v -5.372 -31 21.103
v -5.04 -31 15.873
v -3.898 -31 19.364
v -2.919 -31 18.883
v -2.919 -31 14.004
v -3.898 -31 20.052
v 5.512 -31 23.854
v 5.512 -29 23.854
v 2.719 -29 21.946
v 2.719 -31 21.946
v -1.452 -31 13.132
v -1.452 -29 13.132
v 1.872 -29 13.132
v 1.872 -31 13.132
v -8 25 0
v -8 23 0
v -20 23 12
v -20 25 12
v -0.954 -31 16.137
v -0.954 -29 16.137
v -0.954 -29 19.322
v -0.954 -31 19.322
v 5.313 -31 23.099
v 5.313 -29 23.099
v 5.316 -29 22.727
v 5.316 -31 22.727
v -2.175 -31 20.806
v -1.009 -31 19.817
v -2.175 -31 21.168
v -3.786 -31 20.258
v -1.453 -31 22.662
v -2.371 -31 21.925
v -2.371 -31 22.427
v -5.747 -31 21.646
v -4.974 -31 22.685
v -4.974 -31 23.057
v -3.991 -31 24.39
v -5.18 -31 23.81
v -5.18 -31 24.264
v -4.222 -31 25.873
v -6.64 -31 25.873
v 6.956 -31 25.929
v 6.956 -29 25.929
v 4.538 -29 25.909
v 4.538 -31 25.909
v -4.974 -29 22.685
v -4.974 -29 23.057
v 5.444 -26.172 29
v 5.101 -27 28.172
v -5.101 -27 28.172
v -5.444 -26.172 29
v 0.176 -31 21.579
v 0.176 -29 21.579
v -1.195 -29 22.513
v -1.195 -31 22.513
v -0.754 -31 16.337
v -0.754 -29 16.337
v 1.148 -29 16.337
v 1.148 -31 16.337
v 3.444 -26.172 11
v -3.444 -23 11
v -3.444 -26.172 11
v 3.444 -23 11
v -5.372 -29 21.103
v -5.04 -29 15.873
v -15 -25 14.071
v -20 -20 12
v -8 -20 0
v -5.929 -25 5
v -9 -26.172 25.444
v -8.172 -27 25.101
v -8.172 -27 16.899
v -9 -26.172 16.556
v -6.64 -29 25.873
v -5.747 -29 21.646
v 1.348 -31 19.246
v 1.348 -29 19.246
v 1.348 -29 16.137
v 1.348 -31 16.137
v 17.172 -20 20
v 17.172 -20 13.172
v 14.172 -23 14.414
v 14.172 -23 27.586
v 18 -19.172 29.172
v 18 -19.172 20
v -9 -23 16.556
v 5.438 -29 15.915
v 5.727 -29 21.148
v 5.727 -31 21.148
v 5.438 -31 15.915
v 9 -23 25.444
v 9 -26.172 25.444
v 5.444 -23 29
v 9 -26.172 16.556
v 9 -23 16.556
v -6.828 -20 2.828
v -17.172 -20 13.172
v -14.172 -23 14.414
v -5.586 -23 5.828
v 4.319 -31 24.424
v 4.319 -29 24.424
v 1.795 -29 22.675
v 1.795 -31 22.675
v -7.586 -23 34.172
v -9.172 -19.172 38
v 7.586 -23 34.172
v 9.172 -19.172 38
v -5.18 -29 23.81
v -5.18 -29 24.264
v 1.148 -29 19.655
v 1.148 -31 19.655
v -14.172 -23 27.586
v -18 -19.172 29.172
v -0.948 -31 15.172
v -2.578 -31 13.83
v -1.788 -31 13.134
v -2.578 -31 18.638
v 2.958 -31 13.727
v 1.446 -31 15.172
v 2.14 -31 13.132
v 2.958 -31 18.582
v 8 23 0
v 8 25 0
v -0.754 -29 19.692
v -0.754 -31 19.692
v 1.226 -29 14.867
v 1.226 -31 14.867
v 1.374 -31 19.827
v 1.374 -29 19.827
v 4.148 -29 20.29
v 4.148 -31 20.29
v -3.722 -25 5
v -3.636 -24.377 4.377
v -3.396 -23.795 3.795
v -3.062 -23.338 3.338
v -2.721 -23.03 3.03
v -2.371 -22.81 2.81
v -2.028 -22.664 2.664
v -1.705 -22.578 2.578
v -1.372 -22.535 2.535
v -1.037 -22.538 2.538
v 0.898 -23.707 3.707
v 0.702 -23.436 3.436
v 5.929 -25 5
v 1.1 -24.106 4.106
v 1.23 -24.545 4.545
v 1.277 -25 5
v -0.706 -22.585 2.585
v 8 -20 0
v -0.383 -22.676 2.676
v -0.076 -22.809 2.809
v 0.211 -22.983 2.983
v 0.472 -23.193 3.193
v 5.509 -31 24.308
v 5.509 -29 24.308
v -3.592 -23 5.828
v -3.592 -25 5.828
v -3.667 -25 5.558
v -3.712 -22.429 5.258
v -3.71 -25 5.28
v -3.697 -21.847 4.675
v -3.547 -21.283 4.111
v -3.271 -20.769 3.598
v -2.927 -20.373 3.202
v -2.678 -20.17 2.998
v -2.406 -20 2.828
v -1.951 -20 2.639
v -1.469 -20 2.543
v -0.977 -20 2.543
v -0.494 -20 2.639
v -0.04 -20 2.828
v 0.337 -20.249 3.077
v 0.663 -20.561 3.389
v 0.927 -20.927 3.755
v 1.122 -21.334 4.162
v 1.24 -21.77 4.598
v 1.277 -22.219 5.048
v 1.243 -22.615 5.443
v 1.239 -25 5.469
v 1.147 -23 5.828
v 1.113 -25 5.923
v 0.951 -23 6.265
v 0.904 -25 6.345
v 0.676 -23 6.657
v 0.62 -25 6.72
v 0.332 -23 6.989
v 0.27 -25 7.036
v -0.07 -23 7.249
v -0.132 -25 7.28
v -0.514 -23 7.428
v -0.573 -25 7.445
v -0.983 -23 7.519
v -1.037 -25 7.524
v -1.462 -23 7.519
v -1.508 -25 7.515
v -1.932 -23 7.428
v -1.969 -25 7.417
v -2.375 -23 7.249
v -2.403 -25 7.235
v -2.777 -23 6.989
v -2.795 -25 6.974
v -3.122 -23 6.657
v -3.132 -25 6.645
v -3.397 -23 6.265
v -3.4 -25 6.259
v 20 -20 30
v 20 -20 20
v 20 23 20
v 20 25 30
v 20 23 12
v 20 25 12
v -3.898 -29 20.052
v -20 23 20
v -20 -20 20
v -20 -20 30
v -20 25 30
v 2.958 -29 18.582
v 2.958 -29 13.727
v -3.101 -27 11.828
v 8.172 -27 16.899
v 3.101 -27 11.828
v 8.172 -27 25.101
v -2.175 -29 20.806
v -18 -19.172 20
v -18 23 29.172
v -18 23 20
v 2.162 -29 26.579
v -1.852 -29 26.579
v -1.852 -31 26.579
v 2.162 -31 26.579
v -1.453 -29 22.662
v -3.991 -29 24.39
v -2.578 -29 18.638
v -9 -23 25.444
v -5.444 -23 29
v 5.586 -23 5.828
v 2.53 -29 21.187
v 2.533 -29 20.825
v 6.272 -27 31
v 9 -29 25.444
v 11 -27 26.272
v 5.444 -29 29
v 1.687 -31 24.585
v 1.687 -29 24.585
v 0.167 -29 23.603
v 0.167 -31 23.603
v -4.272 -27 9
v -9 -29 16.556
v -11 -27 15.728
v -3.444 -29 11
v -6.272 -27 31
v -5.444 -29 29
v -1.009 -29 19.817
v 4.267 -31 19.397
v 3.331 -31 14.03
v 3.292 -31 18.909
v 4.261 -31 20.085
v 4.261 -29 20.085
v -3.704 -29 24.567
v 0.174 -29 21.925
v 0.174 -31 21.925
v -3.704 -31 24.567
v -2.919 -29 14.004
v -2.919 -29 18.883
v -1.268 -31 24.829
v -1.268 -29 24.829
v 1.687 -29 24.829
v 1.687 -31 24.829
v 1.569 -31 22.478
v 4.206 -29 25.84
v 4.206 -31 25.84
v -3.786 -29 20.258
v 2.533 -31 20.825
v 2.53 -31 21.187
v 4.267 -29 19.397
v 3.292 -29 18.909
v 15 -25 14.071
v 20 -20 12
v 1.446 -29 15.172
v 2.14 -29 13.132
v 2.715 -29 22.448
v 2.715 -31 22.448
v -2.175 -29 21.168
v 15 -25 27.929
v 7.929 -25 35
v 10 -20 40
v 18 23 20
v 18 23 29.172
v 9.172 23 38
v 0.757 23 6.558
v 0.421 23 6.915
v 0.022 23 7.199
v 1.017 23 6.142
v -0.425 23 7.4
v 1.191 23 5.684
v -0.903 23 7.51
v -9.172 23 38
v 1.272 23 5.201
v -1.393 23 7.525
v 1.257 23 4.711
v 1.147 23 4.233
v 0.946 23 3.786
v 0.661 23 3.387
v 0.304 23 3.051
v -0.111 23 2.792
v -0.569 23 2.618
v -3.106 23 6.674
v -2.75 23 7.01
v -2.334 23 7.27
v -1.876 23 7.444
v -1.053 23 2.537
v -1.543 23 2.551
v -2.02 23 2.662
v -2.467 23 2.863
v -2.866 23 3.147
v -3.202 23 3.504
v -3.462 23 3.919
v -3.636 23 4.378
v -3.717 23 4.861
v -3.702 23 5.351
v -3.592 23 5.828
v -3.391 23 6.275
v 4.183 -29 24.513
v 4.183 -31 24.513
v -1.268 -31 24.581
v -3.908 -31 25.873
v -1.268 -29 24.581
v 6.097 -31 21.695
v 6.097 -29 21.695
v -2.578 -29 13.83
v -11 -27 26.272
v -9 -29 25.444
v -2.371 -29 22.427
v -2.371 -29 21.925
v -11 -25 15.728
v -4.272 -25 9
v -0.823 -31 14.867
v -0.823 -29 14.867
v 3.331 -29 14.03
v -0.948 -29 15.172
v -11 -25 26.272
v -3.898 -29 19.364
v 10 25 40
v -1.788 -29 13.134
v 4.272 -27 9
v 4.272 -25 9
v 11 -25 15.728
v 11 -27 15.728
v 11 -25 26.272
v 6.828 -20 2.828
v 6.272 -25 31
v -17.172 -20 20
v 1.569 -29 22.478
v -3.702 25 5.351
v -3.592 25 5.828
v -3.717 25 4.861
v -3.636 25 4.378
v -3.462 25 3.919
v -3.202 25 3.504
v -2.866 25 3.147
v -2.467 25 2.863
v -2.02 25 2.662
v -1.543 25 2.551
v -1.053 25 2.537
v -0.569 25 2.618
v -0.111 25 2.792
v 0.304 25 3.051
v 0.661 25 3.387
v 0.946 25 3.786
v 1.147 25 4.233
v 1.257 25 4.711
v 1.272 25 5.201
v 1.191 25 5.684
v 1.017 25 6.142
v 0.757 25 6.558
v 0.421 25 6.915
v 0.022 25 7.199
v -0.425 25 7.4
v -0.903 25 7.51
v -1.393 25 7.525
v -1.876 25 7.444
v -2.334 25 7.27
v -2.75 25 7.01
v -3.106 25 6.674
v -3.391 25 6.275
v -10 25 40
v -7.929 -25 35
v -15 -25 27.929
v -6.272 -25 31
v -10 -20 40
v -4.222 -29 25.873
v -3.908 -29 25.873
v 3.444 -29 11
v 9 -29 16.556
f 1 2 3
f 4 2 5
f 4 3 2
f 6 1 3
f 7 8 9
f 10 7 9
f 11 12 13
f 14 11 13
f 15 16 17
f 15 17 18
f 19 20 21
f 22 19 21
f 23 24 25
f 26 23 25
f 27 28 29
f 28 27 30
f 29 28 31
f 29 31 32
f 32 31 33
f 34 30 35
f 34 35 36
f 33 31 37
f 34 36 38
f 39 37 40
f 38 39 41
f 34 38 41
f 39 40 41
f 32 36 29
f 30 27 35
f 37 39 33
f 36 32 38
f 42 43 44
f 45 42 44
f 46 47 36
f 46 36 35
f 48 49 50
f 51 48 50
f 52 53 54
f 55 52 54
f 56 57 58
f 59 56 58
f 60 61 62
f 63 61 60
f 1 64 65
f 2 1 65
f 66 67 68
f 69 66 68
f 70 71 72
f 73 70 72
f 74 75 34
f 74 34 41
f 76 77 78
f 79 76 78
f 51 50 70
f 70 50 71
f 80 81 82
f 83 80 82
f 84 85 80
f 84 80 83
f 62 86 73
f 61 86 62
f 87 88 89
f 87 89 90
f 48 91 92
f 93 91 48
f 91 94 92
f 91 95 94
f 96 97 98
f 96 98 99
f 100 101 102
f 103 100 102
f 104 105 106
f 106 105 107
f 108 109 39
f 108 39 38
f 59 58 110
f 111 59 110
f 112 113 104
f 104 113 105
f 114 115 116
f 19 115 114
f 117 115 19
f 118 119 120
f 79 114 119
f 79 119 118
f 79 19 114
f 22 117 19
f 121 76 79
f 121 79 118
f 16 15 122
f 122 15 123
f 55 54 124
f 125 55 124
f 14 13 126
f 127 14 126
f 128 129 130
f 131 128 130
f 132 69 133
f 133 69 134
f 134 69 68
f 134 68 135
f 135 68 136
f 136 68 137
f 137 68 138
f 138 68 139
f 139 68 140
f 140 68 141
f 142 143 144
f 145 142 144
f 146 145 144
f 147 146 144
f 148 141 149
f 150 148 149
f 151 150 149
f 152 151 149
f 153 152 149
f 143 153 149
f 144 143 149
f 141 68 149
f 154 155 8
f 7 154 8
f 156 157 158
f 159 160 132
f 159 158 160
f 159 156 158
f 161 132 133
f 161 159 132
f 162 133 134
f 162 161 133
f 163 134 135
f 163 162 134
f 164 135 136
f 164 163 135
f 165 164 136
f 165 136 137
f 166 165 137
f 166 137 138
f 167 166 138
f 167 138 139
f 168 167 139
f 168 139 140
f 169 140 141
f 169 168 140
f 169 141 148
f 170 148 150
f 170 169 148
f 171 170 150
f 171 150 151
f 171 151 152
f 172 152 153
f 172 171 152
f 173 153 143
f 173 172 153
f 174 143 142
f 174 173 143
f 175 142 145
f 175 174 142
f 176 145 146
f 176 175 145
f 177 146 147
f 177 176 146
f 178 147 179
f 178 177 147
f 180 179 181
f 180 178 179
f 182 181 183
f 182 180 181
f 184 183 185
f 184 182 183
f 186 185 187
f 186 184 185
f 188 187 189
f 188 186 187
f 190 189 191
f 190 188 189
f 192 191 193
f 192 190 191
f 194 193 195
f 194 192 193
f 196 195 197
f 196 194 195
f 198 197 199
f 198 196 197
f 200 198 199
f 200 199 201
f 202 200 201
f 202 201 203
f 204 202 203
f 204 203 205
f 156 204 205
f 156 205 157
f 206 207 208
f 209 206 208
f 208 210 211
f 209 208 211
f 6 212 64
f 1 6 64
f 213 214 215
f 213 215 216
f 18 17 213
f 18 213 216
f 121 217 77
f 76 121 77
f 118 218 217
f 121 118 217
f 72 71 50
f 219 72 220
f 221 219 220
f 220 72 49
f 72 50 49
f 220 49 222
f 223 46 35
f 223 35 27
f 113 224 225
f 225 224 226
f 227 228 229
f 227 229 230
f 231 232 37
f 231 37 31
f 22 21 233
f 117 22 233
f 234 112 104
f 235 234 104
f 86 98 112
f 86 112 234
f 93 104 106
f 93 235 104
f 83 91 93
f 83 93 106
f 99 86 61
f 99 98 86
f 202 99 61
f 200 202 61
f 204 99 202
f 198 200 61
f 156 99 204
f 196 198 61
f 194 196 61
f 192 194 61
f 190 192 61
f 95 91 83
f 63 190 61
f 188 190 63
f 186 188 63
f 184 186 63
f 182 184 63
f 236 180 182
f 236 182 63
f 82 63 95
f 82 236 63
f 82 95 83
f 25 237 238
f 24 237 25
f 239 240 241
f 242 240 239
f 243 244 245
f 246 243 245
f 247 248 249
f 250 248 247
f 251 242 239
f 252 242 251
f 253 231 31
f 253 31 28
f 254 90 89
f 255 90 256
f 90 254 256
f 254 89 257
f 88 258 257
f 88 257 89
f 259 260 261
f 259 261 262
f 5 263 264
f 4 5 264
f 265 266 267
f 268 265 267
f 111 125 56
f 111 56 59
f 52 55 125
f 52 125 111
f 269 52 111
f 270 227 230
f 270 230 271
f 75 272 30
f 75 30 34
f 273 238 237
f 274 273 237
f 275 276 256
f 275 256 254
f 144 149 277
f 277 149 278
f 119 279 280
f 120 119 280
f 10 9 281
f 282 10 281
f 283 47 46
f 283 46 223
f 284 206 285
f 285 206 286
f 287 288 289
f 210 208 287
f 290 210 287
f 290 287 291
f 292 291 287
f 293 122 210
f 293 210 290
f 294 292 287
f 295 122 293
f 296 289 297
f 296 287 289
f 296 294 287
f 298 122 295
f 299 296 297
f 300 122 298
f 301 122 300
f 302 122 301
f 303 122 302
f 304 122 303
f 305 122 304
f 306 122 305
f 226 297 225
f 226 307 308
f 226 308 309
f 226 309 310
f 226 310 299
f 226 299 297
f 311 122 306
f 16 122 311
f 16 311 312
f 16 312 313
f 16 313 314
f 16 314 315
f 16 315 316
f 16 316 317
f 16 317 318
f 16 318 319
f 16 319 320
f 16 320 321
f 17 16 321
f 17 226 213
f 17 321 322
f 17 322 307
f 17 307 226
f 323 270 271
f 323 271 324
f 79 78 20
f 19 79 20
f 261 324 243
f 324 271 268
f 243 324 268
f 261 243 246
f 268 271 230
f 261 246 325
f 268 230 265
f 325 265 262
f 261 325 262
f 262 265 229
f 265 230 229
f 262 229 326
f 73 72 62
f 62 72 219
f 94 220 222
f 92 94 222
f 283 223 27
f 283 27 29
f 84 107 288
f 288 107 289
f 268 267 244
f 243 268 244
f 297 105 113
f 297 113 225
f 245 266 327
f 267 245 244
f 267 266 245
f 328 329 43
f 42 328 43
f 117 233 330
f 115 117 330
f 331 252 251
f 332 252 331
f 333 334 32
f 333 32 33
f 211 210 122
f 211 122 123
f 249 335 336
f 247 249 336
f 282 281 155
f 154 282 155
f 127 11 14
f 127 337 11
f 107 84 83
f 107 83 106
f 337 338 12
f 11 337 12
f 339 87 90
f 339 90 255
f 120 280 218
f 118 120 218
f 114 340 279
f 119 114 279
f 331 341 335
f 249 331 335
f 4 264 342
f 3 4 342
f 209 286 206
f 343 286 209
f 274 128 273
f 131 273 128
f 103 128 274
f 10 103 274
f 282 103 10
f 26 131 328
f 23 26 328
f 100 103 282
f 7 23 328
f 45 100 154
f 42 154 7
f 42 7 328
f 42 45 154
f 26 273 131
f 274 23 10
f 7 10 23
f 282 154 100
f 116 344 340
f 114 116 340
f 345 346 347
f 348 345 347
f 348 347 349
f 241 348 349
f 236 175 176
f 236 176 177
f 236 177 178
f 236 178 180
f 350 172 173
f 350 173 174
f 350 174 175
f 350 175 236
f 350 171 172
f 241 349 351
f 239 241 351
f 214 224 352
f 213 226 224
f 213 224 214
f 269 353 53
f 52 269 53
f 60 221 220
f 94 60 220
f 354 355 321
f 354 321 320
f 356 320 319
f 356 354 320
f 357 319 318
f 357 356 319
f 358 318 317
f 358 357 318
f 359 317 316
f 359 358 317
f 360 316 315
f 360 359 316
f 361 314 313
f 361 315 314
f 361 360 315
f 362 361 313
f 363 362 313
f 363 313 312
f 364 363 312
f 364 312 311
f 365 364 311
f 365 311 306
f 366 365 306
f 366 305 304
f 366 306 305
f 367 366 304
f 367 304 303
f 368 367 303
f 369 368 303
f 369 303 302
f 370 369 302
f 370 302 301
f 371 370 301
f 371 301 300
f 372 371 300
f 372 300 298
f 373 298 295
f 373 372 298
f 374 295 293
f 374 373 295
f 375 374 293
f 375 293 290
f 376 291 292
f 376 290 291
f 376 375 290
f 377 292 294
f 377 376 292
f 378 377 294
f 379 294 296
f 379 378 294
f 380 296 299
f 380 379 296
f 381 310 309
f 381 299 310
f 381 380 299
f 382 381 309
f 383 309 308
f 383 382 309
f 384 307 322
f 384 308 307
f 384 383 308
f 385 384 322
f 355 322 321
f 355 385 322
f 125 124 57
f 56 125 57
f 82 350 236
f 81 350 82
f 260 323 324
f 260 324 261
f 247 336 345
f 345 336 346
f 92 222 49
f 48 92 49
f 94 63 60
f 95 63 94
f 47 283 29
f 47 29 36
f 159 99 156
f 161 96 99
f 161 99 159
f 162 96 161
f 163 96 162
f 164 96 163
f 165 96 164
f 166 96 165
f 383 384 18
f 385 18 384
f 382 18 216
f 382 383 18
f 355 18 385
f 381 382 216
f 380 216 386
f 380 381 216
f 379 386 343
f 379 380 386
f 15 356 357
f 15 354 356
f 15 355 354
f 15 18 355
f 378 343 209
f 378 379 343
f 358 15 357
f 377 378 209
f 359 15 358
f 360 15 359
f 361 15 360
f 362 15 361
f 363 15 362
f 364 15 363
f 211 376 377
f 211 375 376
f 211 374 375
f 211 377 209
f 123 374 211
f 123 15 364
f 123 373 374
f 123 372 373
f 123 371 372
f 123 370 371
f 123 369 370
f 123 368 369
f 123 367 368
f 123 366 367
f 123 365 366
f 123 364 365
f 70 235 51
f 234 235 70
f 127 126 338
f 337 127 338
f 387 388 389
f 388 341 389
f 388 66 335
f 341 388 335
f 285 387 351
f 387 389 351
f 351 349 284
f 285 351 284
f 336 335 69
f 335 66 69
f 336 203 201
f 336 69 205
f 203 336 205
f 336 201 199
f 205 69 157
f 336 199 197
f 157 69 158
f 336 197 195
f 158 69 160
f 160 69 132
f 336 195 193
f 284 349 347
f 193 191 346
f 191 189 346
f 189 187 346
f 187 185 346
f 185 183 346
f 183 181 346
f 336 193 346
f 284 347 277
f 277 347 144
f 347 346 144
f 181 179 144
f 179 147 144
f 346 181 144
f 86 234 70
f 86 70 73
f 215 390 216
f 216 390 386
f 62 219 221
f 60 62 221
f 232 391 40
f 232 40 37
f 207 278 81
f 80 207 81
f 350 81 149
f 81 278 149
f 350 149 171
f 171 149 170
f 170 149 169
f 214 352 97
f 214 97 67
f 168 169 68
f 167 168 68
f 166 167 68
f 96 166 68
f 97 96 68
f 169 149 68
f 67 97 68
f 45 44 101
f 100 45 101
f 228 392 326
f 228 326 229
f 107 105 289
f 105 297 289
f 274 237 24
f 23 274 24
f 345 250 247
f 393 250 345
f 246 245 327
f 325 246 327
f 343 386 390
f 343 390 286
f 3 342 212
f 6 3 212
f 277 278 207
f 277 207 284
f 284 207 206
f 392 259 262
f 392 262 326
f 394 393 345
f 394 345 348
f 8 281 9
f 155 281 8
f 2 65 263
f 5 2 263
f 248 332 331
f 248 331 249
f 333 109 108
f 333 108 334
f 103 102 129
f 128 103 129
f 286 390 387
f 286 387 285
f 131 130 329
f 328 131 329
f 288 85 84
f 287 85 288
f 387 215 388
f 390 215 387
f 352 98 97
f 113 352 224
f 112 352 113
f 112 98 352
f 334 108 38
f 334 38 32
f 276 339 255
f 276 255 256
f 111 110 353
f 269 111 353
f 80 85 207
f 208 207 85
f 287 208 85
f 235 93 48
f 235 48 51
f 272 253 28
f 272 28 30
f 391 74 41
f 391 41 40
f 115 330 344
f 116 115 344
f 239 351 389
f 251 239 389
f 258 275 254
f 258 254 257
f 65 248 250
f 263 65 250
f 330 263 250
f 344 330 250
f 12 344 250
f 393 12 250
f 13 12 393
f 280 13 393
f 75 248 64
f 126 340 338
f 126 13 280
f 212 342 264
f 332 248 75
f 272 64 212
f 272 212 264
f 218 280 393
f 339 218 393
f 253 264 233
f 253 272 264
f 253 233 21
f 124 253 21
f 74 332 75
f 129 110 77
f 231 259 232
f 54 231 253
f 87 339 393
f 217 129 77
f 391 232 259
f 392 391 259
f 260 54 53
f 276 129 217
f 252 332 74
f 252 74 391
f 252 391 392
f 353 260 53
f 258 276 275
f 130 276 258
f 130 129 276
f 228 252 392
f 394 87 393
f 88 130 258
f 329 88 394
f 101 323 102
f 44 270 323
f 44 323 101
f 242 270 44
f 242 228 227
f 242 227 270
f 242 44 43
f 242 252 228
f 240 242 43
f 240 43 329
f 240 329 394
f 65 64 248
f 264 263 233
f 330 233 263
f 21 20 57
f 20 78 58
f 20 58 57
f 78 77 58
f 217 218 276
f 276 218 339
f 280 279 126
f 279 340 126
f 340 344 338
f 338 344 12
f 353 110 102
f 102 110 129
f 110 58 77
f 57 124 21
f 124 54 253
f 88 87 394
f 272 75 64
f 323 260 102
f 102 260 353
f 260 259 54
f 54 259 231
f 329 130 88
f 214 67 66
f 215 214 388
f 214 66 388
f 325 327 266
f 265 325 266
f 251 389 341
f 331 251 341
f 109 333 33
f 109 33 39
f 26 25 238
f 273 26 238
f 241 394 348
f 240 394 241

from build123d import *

# Parameters (mm, degrees)
SKETCH1_W               = 40
SKETCH1_H               = 50
BOSS_EXTRUDE1_DEPTH     = 40
CHAMFER1_SIZE           = 10
CHAMFER2_SIZE           = 12
CHAMFER4_SIZE           = 5
BOSS_EXTRUDE2_DEPTH     = 4
CHAMFER5_SIZE           = 2
SHELL1_T                = -2
SKETCH3_W               = 45
SKETCH3_H               = 43
CUT_EXTRUDE1_DEPTH      = 20
CUT_EXTRUDE2_DEPTH      = 69.585712798
CUT_EXTRUDE2_DEPTH_BACK = 10
SKETCH4_R               = 2.5
BOSS_EXTRUDE3_DEPTH     = 2


with BuildPart() as part:
    # Sketch1 → Boss-Extrude1 (new body)
    with BuildSketch(Plane.XY):
        Rectangle(SKETCH1_W, SKETCH1_H)
    extrude(amount=BOSS_EXTRUDE1_DEPTH)

    # Chamfer1
    chamfer1_edges = [part.edges().sort_by_distance(p)[0] for p in [
        (-20, 0, 40),
        (20, 0, 40),
    ]]
    chamfer(chamfer1_edges, length=CHAMFER1_SIZE)

    # Chamfer2
    chamfer2_edges = [part.edges().sort_by_distance(p)[0] for p in [
        (-20, 0, 0),
        (20, 0, 0),
    ]]
    chamfer(chamfer2_edges, length=CHAMFER2_SIZE)

    # Chamfer4
    chamfer4_edges = [part.edges().sort_by_distance(p)[0] for p in [
        (0, -25, 40),
        (20, -25, 21),
        (-20, -25, 21),
        (15, -25, 35),
        (-15, -25, 35),
        (0, -25, 0),
        (14, -25, 6),
        (-14, -25, 6),
    ]]
    chamfer(chamfer4_edges, length=CHAMFER4_SIZE)

    # Sketch2 → Boss-Extrude2 (add)
    with BuildSketch(Plane.XZ.offset(25)):
        Polygon((6.272077939, 31), (-6.272077939, 31), (-11, 26.272077939), (-11, 15.727922061), (-4.272077939, 9), (4.272077939, 9), (11, 15.727922061), (11, 26.272077939), align=None)
    extrude(amount=BOSS_EXTRUDE2_DEPTH)

    # Chamfer5
    chamfer5_edges = [part.edges().sort_by_distance(p)[0] for p in [
        (8.636038969, -29, 28.636038969),
        (0, -29, 31),
        (-8.636038969, -29, 28.636038969),
        (-11, -29, 21),
        (-7.636038969, -29, 12.363961031),
        (0, -29, 9),
        (7.636038969, -29, 12.363961031),
        (11, -29, 21),
    ]]
    chamfer(chamfer5_edges, length=CHAMFER5_SIZE)

    # Shell1
    shell1_openings = [part.faces().sort_by_distance(p)[0] for p in [
        (0, 2.5, 0),
    ]]
    offset(amount=SHELL1_T, openings=shell1_openings, kind=Kind.INTERSECTION)

    # Sketch3 → Cut-Extrude1 (cut)
    with BuildSketch(Plane(origin=(0, 0, 0), x_dir=(-1, 0, 0), z_dir=(0, 0, -1))):
        with Locations((-2.5, 1.5)):
            Rectangle(SKETCH3_W, SKETCH3_H)
    extrude(amount=-CUT_EXTRUDE1_DEPTH, mode=Mode.SUBTRACT)

    # Sketch4 → Cut-Extrude2 (cut, two sides: drawn at the far end of the back side and taken through both)
    with BuildSketch(Plane.XZ.offset(-23).offset(-CUT_EXTRUDE2_DEPTH_BACK)):
        with Locations(Location((-1.222653688, 5.030872217, 0), (0, 0, 161.396212333))):
            Circle(SKETCH4_R)
    extrude(amount=CUT_EXTRUDE2_DEPTH + CUT_EXTRUDE2_DEPTH_BACK, mode=Mode.SUBTRACT)

    # Sketch5 → Boss-Extrude3 (add)
    # profile 1 of 8: a face of its own
    with BuildSketch(Plane.XZ.offset(29)):
        Polygon((-3.907968564, 25.873424225), (-1.8521612, 26.578618027), (2.162403013, 26.578618027), (4.206288315, 25.839581431), (4.183149683, 24.513463944), (0.17410729, 21.92507617), (-3.70376403, 24.56651521), align=None)
        Polygon((-1.267927635, 24.828885337), (1.687291293, 24.828885337), (1.687291293, 24.58450637), (0.167260904, 23.603117877), (-1.267927635, 24.580706539), align=None, mode=Mode.SUBTRACT)
    # profile 2 of 8: a face of its own
    with BuildSketch(Plane.XZ.offset(29)):
        Polygon((-6.640454007, 25.873424225), (-4.222410504, 25.873424225), (-3.990642578, 24.390109498), (-1.452911939, 22.661516611), (-1.008516208, 19.817383934), (-3.786282946, 20.257943712), (-5.746633086, 21.646373557), align=None)
        Polygon((-5.179729537, 24.26393897), (-5.179729537, 23.810064286), (-2.37123808, 21.924837325), (-2.37123808, 22.426829117), align=None, mode=Mode.SUBTRACT)
        Polygon((-4.974230162, 23.056566578), (-4.974230162, 22.684710567), (-2.175342033, 20.805929932), (-2.175342033, 21.167929466), align=None, mode=Mode.SUBTRACT)
    # profile 3 of 8: a face of its own
    with BuildSketch(Plane.XZ.offset(29)):
        Polygon((0.175518811, 21.579113739), (-1.194872838, 22.512565549), (-0.754201781, 19.692270785), (-0.754201781, 16.336897736), (1.148015733, 16.336897736), (1.148015733, 19.6551114), (1.568514987, 22.478484191), align=None)
    # profile 4 of 8: a face of its own
    with BuildSketch(Plane.XZ.offset(29)):
        Polygon((-5.371925401, 21.102931741), (-5.040352094, 15.872748244), (-2.918674263, 14.004045062), (-2.918674263, 18.883324606), (-3.897566255, 19.36360058), (-3.897566255, 20.051937661), align=None)
    # profile 5 of 8: a face of its own
    with BuildSketch(Plane.XZ.offset(29)):
        Polygon((-2.57777667, 18.638279212), (-2.57777667, 13.829972979), (-1.787898039, 13.134274183), (-0.948144856, 15.171513794), (1.44618133, 15.171513794), (2.140445472, 13.131762403), (2.958479742, 13.727080014), (2.958479742, 18.581830676), (1.348015733, 19.245666323), (1.348015733, 16.136897736), (-0.954201781, 16.136897736), (-0.954201781, 19.321874117), align=None)
    # profile 6 of 8: a face of its own
    with BuildSketch(Plane.XZ.offset(29)):
        Polygon((-1.452207759, 13.131762403), (1.872175521, 13.131762403), (1.225826325, 14.867356635), (-0.822603437, 14.867356635), align=None)
    # profile 7 of 8: a face of its own
    with BuildSketch(Plane.XZ.offset(29)):
        Polygon((4.147969201, 20.290315345), (6.096924719, 21.694695099), (6.956223847, 25.928898472), (4.538260846, 25.909167636), (4.318604239, 24.424011104), (1.795063119, 22.674768301), (1.373889836, 19.827104116), align=None)
        Polygon((2.719369869, 21.945606931), (2.715273698, 22.447582011), (5.508681142, 24.307547529), (5.512384685, 23.853687956), align=None, mode=Mode.SUBTRACT)
        Polygon((2.532610443, 20.825138309), (2.529656587, 21.187125792), (5.313040568, 23.098538493), (5.316074852, 22.726694861), align=None, mode=Mode.SUBTRACT)
    # profile 8 of 8: a face of its own
    with BuildSketch(Plane.XZ.offset(29)):
        Polygon((4.266546498, 19.396910041), (4.260929781, 20.085224205), (5.726663904, 21.148213823), (5.43777907, 15.915498866), (3.331420184, 14.029545356), (3.291606068, 18.908662459), align=None)
    extrude(amount=BOSS_EXTRUDE3_DEPTH)


solid = part.part
